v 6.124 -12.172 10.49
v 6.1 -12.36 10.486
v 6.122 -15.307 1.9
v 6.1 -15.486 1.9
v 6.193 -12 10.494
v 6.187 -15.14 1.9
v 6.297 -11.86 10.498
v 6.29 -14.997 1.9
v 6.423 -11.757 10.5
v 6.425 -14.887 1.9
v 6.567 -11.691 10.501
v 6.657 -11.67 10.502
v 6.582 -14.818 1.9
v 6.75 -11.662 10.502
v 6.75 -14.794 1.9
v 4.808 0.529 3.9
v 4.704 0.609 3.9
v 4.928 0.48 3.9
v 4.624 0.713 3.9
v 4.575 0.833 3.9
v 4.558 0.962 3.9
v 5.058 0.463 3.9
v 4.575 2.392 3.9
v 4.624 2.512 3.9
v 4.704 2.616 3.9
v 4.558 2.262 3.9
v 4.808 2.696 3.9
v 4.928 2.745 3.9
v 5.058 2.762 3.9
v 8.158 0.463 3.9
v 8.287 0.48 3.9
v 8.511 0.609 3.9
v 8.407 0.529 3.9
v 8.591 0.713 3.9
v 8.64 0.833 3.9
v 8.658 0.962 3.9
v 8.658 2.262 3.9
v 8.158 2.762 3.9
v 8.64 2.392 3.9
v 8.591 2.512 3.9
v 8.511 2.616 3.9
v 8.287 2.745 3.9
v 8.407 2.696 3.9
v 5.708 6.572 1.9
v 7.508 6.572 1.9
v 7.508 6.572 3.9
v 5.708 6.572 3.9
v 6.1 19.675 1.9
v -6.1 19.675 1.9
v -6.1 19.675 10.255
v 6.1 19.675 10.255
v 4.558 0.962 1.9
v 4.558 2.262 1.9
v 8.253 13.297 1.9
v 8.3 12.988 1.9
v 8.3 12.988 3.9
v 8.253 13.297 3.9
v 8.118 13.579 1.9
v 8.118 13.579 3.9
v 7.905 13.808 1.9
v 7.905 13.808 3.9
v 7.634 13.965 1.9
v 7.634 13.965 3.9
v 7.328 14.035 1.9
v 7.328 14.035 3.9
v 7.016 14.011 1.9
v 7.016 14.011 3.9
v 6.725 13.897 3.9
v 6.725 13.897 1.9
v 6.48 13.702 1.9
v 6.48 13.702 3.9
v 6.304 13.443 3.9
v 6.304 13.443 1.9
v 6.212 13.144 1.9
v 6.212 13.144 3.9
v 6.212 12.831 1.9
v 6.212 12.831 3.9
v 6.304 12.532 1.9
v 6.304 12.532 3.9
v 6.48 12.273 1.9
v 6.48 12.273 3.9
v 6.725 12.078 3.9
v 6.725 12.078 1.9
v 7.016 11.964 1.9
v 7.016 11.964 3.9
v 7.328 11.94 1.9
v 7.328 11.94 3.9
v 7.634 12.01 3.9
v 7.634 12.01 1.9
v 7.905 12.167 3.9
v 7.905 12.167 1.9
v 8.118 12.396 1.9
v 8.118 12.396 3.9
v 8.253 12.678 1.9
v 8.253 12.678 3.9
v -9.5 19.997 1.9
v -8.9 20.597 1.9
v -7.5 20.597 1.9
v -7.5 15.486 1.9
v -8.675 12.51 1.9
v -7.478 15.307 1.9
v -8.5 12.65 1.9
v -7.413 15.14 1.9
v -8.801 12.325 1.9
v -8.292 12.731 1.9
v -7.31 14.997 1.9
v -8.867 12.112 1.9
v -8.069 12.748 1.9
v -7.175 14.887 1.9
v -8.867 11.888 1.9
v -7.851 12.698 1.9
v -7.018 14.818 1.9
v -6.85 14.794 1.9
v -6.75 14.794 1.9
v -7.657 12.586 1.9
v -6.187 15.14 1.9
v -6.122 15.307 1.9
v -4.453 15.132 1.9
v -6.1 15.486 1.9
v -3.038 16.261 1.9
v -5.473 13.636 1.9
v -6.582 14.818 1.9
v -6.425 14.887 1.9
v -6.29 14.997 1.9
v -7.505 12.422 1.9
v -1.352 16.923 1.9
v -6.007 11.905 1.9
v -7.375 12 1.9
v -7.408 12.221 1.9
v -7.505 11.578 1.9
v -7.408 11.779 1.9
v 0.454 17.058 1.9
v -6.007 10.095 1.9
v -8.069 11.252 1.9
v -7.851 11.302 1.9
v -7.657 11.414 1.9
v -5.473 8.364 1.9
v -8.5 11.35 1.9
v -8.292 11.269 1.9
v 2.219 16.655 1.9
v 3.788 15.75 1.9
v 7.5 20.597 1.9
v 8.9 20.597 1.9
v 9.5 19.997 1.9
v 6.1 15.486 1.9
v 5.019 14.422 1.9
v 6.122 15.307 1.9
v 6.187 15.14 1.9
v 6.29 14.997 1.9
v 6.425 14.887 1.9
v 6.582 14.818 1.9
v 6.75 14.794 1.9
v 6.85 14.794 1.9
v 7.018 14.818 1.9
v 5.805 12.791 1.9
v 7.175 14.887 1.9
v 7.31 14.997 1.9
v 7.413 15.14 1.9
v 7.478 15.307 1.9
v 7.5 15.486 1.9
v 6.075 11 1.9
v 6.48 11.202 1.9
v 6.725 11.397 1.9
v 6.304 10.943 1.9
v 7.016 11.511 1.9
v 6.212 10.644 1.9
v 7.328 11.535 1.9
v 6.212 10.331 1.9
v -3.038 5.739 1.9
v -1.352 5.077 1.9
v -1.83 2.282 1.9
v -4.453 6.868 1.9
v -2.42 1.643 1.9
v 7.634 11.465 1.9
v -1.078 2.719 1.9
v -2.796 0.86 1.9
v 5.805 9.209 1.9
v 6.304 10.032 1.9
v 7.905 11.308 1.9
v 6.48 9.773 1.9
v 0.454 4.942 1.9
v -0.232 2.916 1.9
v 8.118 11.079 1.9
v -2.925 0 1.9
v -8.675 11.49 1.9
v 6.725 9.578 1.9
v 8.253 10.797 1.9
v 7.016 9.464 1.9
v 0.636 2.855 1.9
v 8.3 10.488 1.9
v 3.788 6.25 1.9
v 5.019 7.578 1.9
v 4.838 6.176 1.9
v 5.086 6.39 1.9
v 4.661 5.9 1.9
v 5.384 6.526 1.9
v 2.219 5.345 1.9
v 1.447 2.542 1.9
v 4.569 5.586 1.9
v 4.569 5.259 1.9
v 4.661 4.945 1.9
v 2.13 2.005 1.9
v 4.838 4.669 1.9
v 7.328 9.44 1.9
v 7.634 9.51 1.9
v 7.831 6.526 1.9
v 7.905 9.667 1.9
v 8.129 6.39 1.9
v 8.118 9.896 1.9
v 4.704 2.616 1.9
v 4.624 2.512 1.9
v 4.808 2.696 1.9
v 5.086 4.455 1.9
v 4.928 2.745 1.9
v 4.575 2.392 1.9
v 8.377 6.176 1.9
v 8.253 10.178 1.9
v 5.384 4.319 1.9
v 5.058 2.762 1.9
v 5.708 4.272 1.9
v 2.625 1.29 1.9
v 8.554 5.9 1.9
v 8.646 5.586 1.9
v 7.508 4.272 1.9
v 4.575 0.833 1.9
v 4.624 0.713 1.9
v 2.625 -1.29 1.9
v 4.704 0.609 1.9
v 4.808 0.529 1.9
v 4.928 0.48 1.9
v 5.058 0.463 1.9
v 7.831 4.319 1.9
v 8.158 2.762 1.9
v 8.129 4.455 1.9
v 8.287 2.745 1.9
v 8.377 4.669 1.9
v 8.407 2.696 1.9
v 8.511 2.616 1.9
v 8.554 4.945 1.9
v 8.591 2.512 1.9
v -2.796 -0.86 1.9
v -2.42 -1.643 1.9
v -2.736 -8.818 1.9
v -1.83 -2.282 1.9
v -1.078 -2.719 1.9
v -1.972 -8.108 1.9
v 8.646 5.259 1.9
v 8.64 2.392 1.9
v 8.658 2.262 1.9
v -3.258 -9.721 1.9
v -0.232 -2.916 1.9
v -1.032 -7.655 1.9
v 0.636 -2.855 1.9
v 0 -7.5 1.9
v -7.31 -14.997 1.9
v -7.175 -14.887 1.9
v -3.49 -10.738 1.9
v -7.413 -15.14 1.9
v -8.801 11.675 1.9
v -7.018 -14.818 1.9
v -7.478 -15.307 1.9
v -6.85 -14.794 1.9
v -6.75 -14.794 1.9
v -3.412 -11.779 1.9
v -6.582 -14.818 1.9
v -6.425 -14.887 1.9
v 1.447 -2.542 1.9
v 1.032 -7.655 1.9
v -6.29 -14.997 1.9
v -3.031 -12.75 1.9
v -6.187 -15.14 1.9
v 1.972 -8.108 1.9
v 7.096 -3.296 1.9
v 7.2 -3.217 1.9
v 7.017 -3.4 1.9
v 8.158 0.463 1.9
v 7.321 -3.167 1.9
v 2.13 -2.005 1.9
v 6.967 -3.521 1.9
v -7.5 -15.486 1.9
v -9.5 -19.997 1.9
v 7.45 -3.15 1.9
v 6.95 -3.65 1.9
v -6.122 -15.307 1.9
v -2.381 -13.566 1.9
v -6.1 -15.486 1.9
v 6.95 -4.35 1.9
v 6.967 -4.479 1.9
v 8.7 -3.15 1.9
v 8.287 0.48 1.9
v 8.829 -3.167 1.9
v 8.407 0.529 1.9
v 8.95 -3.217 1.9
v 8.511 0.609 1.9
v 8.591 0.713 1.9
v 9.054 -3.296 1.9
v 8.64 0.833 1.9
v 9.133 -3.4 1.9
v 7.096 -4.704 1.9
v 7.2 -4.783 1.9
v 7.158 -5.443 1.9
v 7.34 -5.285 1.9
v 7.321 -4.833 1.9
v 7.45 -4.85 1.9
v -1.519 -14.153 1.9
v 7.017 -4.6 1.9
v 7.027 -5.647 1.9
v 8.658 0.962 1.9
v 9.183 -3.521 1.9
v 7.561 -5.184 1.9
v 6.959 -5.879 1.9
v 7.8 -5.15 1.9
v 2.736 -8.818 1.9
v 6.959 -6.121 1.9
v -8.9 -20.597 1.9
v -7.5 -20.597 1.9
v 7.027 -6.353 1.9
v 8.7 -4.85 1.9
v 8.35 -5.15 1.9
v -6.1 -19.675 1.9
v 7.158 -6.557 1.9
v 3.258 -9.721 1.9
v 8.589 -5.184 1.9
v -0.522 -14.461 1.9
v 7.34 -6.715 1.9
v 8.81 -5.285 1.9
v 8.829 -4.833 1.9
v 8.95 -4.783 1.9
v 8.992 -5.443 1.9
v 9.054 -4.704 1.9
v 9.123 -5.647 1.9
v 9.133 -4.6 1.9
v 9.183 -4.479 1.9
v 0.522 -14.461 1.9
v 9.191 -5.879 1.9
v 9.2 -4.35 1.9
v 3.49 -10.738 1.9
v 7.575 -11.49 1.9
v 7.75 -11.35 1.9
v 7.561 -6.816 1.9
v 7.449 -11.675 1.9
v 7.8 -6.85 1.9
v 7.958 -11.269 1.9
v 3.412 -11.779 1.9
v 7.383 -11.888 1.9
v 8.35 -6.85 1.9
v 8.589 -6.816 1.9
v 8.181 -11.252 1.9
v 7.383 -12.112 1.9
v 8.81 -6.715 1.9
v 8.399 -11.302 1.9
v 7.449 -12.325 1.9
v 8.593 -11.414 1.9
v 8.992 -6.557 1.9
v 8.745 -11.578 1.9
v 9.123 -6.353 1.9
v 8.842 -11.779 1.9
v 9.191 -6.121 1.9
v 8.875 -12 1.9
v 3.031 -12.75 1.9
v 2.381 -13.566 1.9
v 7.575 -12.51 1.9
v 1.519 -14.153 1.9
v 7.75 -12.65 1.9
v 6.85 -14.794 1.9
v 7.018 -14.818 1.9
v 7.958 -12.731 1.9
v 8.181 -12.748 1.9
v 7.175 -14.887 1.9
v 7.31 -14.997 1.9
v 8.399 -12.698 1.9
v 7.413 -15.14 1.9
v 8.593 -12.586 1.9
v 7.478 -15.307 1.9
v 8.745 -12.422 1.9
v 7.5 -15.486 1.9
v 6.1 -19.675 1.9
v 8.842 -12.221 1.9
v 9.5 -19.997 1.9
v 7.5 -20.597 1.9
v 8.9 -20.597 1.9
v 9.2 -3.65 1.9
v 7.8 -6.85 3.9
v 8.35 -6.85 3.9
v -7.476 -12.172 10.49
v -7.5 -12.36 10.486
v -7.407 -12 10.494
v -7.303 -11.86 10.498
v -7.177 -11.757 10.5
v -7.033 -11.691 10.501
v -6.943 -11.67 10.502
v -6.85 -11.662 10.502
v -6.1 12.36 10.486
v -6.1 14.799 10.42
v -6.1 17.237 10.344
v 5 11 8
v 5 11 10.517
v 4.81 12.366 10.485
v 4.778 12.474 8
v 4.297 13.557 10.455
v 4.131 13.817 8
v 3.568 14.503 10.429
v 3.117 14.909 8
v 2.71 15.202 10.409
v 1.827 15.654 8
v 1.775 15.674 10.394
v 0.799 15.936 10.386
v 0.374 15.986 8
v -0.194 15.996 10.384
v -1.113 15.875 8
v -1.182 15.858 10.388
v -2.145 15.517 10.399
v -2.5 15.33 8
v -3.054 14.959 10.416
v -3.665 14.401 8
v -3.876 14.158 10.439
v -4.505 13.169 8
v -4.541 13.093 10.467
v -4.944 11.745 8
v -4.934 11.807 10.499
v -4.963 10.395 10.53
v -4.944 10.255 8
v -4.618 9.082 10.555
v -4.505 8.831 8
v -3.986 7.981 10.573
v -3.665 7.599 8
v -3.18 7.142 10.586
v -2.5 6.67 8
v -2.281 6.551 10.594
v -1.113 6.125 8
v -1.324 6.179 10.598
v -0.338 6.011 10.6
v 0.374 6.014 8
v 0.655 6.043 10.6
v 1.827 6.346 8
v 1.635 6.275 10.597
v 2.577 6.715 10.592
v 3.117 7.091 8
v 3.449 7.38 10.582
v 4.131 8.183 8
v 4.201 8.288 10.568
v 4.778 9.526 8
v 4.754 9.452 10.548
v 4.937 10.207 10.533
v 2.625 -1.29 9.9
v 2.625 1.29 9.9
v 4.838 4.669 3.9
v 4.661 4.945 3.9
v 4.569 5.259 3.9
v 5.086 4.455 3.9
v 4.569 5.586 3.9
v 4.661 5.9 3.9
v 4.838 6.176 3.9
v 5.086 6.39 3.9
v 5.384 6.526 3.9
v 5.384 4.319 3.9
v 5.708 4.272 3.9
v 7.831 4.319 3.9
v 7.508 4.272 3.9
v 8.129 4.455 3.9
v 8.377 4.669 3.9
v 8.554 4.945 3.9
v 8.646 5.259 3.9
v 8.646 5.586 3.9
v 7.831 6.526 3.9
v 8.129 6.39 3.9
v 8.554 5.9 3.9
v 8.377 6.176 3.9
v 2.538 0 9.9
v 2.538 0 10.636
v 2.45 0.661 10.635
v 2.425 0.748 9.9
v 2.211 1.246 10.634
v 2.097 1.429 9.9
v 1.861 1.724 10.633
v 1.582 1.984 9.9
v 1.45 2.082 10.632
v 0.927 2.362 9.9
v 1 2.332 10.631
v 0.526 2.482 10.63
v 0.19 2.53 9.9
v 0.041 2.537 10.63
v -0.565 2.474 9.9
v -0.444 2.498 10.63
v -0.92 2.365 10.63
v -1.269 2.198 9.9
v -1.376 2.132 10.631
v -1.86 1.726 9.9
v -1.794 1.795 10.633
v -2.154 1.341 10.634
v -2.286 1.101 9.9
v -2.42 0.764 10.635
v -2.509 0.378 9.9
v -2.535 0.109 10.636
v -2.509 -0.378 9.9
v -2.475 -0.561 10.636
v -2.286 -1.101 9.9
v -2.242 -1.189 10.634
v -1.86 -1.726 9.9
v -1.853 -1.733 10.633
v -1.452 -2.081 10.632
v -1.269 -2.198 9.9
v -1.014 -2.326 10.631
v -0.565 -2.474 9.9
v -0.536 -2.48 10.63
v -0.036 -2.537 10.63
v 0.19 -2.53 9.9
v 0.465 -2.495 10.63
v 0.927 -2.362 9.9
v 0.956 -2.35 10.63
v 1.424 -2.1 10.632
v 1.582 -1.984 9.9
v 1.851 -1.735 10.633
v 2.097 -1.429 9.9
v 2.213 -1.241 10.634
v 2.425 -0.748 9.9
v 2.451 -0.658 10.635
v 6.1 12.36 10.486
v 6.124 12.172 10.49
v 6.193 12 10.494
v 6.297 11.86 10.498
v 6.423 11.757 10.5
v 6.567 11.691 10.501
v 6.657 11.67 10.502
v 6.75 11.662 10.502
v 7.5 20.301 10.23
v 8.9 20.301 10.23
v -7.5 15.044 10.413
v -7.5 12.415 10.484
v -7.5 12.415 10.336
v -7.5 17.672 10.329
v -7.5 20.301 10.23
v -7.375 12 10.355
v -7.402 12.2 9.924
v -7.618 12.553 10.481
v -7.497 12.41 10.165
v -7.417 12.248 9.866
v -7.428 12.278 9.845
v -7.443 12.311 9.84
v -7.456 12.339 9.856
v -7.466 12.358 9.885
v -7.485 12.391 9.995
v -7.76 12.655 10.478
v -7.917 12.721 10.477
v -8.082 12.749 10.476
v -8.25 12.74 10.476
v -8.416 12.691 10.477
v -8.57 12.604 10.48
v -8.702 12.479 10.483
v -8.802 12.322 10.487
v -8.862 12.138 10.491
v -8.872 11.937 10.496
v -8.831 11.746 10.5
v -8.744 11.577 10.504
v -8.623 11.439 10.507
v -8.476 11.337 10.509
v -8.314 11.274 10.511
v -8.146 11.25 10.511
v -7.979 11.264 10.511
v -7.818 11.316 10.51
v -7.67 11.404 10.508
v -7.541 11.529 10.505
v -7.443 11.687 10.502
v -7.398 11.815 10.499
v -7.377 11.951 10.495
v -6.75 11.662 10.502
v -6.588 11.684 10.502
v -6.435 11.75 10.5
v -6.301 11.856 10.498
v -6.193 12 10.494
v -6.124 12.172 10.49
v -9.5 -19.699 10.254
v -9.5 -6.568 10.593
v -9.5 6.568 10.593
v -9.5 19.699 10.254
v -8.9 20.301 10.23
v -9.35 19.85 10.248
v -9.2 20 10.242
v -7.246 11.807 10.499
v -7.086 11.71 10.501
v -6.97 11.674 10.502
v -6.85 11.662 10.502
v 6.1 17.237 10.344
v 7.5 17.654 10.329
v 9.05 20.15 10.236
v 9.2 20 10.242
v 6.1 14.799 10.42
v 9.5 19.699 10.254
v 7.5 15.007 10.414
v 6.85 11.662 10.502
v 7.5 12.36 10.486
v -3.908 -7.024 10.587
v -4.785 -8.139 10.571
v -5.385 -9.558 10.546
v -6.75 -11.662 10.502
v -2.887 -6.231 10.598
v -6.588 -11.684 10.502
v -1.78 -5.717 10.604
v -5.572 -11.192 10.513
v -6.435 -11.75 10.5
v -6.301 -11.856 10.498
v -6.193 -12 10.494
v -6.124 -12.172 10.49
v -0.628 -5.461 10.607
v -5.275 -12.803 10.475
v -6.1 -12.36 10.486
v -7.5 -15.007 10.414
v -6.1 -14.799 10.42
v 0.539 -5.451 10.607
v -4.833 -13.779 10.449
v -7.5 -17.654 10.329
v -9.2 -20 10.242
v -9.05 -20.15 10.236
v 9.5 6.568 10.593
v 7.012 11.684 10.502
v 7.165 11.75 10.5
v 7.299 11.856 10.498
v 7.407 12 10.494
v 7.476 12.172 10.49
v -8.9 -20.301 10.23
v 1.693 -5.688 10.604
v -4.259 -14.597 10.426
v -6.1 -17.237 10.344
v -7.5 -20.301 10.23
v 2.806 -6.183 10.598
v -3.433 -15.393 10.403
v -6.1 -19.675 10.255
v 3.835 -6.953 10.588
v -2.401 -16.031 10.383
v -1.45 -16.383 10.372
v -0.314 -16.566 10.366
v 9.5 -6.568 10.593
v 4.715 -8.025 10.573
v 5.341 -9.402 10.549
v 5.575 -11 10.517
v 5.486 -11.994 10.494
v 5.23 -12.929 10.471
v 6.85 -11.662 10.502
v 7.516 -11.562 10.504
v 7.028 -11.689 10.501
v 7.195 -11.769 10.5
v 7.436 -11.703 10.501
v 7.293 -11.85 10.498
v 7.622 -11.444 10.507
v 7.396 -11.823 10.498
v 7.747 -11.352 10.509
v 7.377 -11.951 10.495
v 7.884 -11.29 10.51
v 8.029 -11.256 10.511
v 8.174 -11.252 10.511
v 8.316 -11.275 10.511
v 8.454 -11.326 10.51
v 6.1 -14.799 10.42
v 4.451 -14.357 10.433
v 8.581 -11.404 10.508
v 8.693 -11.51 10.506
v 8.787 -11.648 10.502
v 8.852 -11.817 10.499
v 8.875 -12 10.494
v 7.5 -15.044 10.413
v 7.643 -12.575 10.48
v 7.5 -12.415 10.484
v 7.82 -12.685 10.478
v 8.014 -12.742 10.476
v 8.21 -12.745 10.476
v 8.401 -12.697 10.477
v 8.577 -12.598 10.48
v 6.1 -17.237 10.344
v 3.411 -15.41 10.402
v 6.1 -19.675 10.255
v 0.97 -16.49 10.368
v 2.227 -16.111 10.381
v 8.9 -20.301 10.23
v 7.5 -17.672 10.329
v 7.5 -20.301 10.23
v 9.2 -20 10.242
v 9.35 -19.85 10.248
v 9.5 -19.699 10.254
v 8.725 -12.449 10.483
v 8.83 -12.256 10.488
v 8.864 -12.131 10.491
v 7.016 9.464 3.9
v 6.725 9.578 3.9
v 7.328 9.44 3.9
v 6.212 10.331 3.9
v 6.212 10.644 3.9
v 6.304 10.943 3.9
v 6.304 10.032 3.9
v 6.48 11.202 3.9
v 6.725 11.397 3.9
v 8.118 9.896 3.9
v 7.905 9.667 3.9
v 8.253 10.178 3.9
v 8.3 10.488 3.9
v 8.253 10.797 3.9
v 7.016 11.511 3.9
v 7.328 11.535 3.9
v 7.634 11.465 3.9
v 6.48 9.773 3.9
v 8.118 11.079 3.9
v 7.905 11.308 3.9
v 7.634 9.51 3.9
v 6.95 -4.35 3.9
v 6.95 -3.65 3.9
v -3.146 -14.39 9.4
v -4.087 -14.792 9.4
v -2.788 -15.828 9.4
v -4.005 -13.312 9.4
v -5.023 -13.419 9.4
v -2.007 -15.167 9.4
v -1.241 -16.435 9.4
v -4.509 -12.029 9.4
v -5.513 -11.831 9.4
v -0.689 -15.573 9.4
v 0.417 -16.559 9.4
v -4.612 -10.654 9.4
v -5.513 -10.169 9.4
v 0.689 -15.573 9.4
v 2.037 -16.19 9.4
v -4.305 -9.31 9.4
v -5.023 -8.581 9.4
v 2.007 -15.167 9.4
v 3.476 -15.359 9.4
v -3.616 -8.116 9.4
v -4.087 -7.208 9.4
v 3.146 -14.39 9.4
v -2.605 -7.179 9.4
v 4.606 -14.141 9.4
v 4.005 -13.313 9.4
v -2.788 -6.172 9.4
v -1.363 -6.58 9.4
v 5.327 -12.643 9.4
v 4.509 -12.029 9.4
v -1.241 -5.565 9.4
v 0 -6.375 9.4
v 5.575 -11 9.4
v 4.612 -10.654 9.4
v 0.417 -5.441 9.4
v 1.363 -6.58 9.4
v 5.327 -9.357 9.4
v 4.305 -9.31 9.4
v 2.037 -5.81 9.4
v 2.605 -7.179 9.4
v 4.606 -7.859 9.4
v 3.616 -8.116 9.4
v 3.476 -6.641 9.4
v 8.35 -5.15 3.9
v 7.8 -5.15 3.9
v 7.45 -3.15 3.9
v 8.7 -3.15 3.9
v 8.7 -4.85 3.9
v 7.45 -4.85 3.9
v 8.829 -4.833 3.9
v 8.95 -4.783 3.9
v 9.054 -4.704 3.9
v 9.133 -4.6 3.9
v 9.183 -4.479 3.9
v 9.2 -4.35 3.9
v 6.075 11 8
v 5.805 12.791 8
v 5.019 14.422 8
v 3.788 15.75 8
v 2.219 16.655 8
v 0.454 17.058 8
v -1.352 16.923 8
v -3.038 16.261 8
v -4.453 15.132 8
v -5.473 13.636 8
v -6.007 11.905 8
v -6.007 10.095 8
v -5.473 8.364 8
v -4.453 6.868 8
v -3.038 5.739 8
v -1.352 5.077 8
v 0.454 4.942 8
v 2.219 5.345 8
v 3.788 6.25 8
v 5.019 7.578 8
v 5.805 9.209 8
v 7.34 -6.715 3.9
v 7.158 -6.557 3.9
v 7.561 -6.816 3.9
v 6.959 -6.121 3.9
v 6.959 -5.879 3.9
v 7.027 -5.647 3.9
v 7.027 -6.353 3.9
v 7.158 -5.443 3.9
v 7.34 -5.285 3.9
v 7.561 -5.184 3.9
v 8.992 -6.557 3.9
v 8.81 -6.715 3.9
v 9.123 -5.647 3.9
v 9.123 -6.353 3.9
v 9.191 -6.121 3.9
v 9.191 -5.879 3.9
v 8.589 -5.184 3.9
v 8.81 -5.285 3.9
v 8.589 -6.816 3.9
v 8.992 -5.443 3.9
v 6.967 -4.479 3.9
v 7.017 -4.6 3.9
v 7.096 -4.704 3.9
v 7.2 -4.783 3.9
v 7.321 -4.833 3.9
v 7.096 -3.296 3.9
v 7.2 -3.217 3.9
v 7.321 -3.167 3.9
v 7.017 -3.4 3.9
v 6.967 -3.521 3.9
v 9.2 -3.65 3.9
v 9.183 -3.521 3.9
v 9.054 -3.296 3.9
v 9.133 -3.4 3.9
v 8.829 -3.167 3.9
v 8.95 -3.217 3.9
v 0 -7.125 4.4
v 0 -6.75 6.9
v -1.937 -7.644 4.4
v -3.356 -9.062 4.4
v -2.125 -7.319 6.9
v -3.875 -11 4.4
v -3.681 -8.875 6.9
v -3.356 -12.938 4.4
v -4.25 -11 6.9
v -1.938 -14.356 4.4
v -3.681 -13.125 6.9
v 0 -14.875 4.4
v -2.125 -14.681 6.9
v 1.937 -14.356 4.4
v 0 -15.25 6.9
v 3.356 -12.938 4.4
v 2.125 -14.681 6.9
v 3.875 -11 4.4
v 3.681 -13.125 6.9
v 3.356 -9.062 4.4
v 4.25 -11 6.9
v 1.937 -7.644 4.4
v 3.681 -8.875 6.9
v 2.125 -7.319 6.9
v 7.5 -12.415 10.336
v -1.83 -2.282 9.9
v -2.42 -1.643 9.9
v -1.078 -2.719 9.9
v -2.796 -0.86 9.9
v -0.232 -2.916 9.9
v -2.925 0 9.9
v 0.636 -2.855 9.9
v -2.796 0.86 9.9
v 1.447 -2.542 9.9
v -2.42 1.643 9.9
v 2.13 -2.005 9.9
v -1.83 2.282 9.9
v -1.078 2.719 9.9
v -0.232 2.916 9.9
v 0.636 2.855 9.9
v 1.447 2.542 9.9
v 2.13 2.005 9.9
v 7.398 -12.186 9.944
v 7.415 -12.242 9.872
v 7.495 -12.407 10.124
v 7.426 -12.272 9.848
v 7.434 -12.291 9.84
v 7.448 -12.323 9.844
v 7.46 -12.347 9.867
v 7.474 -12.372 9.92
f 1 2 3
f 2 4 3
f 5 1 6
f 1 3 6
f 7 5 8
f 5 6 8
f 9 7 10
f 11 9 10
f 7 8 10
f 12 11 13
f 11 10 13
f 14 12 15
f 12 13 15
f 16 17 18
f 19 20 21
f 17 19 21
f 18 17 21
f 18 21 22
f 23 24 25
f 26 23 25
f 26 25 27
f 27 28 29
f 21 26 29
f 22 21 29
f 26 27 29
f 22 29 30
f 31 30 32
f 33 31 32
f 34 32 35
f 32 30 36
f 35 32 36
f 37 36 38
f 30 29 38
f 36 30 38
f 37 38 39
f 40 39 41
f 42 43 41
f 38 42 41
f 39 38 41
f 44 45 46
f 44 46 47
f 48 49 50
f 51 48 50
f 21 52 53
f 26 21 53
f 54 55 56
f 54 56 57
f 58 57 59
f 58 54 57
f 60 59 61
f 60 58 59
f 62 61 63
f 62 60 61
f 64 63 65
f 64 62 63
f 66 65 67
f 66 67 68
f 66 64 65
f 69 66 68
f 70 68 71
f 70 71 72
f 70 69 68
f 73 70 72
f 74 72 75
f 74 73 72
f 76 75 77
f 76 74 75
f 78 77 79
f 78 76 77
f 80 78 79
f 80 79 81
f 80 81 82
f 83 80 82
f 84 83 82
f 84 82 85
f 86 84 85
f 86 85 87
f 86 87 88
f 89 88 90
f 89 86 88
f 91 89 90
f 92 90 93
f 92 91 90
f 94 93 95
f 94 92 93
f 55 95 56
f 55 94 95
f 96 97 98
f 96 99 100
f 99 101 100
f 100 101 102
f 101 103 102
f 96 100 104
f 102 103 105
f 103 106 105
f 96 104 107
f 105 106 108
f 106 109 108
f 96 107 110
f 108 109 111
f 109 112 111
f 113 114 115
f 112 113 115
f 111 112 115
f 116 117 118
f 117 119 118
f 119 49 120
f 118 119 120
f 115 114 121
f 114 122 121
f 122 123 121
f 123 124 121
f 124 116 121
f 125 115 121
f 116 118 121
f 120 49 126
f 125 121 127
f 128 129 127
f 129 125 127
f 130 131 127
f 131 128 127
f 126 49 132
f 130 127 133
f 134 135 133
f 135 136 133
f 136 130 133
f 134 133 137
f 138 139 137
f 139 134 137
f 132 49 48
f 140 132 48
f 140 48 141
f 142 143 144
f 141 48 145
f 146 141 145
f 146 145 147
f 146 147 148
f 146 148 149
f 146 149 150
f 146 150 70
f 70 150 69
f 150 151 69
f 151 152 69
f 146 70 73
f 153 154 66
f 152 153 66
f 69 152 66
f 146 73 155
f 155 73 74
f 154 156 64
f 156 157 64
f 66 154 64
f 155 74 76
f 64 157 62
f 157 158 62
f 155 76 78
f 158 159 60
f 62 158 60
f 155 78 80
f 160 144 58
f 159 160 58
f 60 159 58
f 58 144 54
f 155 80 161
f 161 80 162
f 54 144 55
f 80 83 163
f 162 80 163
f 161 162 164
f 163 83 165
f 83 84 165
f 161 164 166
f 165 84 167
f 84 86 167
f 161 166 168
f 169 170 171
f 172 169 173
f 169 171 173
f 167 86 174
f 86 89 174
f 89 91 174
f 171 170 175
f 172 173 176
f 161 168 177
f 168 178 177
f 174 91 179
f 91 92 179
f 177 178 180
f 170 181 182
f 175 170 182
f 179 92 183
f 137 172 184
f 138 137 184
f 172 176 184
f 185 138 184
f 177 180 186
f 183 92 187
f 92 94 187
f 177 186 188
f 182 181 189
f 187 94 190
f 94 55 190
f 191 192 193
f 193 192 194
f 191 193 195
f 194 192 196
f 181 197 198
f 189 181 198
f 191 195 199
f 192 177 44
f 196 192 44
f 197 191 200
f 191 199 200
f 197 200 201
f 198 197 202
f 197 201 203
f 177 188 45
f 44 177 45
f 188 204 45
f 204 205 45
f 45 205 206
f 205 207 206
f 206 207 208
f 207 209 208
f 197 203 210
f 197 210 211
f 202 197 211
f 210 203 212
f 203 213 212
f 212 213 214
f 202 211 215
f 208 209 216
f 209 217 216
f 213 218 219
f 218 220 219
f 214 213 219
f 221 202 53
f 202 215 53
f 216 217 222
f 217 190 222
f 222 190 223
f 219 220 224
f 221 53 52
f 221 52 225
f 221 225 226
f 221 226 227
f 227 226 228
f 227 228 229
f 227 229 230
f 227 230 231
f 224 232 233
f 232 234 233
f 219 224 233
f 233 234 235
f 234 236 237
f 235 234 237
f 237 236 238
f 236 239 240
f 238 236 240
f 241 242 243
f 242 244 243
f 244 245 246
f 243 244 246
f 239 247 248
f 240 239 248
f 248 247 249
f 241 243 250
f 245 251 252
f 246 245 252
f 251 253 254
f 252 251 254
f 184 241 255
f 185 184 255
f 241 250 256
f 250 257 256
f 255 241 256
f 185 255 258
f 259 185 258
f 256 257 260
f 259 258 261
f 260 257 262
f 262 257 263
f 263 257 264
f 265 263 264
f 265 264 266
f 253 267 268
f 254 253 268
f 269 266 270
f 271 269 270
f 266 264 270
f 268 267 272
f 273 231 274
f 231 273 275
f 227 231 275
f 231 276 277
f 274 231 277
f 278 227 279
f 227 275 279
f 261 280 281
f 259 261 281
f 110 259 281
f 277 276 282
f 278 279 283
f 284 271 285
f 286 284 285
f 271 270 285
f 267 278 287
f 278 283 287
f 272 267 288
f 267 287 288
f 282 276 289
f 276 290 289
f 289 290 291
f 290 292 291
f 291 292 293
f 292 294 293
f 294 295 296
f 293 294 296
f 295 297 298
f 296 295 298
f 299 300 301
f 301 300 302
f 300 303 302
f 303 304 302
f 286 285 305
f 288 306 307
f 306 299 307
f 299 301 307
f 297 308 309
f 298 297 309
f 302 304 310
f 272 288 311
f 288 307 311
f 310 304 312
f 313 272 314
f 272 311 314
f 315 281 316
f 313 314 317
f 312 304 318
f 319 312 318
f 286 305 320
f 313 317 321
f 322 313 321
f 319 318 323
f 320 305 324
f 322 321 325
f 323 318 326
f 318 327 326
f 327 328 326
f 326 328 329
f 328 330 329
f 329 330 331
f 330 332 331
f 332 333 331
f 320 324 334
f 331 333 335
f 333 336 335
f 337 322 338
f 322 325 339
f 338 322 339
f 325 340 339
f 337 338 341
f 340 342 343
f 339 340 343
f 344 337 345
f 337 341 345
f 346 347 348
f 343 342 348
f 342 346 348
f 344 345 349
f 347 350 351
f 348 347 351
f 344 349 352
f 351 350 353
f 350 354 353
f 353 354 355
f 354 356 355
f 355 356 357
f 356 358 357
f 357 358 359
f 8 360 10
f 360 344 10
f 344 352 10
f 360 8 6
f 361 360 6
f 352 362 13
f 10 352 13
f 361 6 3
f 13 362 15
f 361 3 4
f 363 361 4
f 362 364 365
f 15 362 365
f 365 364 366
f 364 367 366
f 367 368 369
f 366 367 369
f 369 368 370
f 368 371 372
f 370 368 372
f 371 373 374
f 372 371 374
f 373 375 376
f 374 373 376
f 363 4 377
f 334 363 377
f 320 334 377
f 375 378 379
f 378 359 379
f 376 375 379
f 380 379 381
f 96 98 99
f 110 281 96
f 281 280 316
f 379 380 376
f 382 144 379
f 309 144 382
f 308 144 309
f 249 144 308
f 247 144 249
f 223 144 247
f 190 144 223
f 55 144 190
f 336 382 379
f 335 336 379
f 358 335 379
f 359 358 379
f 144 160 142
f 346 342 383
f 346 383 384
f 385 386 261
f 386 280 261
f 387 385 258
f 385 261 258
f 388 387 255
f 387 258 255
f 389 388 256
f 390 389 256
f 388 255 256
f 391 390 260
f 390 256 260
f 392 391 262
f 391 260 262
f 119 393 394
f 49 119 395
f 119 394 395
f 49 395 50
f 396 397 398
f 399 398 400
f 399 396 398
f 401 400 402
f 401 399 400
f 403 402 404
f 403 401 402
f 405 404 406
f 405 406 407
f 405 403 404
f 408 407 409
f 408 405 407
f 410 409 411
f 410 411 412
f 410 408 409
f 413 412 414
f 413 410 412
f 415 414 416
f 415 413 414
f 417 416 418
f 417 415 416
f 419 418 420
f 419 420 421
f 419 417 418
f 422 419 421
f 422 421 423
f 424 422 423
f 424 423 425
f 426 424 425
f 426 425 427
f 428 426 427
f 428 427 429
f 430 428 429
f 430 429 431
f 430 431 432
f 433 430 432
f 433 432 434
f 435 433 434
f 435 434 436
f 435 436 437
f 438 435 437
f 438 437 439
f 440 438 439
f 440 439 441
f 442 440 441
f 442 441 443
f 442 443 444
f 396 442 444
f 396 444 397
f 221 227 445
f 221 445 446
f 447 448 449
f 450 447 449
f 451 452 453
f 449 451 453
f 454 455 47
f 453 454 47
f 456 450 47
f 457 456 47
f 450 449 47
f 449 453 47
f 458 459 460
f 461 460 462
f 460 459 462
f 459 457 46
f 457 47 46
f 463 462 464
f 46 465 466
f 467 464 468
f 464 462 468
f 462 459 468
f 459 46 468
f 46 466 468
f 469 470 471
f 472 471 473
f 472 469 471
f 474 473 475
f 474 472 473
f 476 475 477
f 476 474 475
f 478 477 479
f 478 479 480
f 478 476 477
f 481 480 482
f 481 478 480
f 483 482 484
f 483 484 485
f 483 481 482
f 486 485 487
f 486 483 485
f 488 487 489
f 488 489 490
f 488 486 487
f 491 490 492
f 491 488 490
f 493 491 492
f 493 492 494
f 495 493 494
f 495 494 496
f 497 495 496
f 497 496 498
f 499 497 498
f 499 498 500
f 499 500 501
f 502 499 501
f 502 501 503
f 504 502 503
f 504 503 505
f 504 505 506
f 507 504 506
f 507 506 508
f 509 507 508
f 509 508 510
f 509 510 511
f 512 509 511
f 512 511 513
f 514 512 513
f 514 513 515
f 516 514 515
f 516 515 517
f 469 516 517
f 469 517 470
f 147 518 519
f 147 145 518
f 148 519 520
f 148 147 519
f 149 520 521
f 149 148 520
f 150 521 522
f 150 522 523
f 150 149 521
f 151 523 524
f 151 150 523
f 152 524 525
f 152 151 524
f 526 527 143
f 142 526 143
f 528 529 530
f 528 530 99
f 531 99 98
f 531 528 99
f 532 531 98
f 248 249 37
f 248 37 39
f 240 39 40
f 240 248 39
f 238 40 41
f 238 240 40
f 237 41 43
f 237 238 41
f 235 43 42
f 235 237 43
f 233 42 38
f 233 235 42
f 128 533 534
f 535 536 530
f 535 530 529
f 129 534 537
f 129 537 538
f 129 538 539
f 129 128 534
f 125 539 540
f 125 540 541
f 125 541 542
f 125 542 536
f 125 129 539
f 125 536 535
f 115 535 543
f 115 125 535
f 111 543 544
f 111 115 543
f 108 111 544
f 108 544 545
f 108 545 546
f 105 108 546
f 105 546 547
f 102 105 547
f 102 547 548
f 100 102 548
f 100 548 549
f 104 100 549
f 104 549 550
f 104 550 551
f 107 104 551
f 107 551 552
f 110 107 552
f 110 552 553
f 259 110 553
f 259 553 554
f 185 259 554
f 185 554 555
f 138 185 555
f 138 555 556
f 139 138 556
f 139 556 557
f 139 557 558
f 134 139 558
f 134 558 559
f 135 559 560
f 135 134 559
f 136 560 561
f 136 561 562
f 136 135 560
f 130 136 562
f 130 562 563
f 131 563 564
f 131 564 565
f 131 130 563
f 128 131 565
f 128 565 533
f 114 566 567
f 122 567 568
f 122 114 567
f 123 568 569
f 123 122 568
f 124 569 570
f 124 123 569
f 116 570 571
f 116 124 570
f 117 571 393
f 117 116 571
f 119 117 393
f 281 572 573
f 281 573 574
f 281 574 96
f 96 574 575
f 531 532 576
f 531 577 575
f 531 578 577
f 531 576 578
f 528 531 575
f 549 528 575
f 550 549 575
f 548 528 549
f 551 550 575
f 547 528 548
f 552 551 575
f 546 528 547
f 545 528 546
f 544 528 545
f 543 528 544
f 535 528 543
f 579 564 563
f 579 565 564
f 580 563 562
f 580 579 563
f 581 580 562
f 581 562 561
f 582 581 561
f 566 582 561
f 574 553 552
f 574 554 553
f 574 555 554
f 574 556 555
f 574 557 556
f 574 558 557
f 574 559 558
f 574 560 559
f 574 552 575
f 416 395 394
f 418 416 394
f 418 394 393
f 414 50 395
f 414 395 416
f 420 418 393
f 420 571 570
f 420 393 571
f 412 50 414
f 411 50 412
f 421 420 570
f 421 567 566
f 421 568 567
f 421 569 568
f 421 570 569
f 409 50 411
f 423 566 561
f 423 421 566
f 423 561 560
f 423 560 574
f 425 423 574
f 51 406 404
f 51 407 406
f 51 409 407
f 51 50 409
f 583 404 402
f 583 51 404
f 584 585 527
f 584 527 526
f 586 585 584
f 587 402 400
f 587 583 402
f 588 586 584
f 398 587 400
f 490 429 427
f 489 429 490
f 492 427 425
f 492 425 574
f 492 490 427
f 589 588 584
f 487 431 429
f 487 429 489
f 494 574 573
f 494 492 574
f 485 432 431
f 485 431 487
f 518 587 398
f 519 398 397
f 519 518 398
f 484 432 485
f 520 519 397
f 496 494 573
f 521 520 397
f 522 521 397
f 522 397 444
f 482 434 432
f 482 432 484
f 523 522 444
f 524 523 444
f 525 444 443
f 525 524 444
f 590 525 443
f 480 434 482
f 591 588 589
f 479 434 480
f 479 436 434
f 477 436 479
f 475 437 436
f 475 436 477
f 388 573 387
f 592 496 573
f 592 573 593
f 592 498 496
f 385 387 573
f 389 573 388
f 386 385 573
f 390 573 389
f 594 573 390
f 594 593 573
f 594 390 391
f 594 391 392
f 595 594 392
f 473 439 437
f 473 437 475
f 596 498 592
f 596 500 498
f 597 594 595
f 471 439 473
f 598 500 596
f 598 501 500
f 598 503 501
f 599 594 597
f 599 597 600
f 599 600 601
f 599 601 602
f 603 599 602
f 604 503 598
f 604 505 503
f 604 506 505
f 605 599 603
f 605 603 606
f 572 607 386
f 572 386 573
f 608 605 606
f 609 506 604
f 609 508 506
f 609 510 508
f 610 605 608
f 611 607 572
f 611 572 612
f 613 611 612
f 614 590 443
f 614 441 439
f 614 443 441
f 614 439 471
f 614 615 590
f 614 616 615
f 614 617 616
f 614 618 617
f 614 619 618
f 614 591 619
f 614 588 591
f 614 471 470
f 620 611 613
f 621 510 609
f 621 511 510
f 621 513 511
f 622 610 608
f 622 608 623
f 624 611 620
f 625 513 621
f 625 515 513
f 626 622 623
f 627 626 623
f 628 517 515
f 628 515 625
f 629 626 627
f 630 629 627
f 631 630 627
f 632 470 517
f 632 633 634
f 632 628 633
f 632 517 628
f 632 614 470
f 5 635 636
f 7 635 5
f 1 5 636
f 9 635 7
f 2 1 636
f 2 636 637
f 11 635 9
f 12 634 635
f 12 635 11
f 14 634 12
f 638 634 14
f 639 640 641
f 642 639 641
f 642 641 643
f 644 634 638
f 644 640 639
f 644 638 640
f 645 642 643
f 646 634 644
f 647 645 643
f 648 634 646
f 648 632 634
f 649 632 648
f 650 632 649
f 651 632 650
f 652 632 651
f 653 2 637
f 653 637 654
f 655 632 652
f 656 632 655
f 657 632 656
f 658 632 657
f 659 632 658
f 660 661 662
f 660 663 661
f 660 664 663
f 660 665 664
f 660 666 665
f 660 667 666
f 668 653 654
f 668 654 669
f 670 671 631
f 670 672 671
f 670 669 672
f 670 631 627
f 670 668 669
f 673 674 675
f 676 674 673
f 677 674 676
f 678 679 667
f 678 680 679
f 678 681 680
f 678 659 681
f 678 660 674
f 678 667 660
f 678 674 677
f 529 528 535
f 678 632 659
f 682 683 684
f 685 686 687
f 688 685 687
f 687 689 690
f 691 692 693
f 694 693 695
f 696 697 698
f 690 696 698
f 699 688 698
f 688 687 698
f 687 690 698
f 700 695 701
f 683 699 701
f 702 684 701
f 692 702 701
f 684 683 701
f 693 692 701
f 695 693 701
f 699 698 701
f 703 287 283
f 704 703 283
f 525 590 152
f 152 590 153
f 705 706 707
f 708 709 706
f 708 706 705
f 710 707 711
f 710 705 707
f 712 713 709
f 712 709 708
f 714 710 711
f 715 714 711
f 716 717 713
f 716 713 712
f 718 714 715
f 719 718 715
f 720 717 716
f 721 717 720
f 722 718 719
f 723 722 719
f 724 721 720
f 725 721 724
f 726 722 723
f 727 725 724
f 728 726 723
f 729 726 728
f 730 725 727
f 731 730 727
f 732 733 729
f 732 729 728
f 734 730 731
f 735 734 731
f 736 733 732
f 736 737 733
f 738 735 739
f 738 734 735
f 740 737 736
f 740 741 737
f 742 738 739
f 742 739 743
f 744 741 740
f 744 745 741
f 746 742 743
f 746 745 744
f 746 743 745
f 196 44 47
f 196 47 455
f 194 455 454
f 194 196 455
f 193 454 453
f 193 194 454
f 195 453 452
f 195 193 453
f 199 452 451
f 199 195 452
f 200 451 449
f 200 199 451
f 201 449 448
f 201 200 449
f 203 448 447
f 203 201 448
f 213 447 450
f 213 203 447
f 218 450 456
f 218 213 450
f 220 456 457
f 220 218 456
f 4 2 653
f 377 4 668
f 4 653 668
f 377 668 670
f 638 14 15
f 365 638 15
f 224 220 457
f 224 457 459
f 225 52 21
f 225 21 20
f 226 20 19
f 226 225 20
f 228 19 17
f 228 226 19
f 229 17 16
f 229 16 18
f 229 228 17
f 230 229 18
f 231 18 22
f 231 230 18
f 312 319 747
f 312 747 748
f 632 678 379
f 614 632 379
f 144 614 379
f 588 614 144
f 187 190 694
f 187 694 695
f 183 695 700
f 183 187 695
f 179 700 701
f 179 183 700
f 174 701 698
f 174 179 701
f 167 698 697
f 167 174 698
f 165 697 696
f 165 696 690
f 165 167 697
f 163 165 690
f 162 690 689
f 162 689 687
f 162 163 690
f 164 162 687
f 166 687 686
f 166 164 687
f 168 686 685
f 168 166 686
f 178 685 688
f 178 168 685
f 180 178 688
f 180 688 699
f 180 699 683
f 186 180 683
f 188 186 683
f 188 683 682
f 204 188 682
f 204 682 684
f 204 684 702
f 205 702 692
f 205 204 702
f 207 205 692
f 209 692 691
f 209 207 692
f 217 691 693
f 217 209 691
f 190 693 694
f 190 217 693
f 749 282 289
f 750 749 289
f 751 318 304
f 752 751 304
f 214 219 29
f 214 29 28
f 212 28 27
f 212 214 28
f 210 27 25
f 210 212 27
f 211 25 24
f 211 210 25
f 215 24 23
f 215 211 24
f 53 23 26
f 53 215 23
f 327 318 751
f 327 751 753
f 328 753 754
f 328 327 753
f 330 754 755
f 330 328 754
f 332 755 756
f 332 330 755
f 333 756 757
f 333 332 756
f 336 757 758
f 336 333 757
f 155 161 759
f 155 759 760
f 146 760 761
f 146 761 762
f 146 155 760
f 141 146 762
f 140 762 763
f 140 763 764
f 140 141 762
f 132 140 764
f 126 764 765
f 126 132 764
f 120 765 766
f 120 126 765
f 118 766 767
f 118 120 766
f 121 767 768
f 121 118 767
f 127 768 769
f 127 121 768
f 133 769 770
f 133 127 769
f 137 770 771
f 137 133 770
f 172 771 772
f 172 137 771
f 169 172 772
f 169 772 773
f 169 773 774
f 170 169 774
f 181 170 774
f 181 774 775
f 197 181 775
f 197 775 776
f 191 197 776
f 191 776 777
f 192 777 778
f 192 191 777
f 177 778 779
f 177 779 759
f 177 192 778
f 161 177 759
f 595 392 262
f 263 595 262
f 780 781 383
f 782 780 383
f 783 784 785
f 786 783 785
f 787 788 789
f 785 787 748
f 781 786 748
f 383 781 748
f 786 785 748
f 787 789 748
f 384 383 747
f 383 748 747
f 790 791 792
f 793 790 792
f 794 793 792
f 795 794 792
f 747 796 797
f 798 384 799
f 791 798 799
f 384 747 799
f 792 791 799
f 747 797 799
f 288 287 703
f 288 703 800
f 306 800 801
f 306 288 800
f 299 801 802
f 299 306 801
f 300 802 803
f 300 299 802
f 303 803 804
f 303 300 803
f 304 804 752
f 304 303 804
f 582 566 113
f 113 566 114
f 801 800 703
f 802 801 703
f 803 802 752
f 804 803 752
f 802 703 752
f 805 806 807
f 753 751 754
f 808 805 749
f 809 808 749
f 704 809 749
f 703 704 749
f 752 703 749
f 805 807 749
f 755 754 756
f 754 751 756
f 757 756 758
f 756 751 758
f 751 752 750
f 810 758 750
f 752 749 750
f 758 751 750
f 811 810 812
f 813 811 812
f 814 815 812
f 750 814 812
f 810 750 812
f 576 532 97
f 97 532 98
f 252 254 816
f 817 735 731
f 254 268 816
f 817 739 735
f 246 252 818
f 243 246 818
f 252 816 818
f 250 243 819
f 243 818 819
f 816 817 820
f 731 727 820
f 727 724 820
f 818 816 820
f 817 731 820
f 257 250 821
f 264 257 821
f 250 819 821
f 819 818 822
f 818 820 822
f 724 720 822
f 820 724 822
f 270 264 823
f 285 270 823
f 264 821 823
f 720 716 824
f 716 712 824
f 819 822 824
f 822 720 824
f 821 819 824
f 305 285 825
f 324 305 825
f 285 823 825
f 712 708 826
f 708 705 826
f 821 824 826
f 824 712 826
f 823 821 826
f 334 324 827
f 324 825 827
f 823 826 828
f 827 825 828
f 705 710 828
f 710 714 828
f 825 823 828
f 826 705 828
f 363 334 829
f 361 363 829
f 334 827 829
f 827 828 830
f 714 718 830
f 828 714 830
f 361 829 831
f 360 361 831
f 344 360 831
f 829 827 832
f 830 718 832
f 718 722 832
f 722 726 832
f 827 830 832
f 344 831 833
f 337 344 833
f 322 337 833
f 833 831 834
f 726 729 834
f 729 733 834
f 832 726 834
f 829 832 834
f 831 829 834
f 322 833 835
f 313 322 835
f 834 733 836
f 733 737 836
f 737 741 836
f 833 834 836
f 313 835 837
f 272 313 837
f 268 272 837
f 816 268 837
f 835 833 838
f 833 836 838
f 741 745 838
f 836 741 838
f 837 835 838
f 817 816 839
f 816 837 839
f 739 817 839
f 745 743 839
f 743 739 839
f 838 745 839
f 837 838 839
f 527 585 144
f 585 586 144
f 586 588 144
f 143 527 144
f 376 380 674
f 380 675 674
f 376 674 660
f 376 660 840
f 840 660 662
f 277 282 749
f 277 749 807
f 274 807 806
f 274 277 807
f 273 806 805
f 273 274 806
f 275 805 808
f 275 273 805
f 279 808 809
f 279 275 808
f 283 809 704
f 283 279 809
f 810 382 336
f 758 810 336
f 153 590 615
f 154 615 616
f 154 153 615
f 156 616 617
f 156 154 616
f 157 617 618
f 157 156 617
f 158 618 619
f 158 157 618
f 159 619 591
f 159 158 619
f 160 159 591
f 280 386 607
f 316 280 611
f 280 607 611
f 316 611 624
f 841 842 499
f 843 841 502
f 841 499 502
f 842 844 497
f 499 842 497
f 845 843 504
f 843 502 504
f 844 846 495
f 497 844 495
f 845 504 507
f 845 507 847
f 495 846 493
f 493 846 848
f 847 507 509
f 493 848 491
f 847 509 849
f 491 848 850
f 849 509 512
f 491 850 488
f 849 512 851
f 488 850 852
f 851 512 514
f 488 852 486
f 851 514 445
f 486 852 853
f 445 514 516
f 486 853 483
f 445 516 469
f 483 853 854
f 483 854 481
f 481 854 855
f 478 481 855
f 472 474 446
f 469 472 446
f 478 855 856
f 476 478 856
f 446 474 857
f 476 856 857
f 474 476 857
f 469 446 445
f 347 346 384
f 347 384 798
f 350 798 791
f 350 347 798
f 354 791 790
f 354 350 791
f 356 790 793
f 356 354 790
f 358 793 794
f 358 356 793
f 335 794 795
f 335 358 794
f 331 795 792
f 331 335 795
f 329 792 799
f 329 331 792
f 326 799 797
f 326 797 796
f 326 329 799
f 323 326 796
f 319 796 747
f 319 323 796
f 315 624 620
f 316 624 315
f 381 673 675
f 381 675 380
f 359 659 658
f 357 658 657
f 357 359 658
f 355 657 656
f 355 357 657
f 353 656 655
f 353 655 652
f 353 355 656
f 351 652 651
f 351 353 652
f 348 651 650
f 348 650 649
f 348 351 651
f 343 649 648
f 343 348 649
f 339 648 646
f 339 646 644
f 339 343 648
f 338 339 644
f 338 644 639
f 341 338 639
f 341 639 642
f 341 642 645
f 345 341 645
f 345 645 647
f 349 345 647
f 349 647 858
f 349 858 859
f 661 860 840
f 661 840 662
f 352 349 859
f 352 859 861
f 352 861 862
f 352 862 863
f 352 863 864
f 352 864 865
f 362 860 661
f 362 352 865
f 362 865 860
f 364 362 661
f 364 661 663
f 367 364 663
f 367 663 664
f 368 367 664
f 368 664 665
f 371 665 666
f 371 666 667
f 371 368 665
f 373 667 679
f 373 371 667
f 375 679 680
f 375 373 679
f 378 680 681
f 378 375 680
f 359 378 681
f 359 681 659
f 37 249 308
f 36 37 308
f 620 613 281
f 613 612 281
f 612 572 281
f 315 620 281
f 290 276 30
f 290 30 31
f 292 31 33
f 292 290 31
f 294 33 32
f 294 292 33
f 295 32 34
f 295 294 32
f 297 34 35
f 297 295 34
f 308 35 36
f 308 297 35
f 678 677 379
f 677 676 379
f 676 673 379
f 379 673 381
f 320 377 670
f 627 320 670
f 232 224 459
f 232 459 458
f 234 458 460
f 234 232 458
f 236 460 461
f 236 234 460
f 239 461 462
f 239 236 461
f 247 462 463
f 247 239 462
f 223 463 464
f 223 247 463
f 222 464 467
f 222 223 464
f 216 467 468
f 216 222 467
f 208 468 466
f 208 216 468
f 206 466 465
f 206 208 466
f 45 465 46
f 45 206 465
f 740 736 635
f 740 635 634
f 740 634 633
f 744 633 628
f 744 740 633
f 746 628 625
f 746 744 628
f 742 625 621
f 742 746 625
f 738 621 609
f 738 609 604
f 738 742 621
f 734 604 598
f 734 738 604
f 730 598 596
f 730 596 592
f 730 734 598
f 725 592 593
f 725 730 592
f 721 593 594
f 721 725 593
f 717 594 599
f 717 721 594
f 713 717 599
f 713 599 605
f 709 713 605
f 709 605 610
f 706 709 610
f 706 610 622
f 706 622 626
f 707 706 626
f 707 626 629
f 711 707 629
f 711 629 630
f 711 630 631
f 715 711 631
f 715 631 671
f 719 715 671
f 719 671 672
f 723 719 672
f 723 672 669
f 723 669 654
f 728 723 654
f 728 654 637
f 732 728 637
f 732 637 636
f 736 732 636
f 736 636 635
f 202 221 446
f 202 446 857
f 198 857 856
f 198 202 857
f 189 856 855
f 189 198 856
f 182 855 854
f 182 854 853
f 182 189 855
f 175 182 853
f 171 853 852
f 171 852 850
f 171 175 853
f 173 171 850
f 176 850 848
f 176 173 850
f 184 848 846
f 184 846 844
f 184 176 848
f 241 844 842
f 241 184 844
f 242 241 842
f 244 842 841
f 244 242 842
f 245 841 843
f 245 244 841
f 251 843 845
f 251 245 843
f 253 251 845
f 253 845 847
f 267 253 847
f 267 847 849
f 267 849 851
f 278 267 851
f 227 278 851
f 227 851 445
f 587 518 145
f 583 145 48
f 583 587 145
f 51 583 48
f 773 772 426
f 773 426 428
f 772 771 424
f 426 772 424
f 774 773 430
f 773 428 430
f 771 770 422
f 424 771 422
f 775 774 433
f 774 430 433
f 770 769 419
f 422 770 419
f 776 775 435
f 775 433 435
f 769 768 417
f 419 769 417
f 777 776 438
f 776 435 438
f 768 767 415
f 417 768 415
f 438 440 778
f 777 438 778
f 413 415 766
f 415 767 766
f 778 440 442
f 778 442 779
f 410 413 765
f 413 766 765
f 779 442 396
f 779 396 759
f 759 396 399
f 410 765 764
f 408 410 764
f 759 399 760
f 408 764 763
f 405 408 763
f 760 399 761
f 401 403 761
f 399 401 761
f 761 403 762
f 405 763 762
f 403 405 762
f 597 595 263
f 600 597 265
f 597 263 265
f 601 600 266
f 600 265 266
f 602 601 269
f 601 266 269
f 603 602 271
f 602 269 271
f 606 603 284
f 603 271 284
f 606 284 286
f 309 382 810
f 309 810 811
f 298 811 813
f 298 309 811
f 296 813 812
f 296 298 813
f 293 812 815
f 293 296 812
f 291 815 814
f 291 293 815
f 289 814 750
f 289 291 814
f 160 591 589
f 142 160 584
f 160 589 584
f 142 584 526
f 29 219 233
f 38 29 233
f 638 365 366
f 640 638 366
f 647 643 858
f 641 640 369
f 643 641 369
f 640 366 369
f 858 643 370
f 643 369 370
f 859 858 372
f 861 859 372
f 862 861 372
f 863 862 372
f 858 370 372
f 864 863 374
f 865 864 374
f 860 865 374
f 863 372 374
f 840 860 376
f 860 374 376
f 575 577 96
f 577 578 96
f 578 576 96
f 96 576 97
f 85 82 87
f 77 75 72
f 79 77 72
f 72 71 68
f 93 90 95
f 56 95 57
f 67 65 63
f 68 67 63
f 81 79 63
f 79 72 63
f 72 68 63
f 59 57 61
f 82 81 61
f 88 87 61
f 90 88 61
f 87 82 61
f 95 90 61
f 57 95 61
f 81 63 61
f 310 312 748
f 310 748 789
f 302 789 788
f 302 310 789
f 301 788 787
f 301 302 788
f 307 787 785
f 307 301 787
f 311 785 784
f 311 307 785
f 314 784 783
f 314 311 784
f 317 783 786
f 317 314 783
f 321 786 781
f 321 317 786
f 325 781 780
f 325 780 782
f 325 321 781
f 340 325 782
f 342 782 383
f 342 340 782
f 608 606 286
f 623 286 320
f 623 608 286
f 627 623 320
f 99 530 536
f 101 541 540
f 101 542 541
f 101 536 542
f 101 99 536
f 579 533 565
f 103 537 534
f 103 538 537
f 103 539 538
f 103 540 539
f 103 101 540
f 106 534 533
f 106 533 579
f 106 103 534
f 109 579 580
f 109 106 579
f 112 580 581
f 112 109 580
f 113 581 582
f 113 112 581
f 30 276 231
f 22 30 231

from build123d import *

# Parameters (mm, degrees)
PAD008_DEPTH    = 9.5
SKETCH017_W     = 3
SKETCH017_H     = 10
POCKET002_DEPTH = 7.5
POCKET003_DEPTH = 0.7
POCKET004_DEPTH = 0.7
CHAMFER001_SIZE = 0.6
FILLET002_R     = 0.65
SKETCH014_R     = 1.05
POCKET005_DEPTH = 2
POCKET006_DEPTH = 8
SKETCH022_R     = 2.5375
POCKET007_DEPTH = 8.736873
SKETCH021_R     = 5.575
POCKET008_DEPTH = 1.236873
SKETCH024_R     = 6.075
POCKET009_DEPTH = 6.1
SKETCH025_R     = 5
POCKET010_DEPTH = 8.736873
SKETCH015_R     = 0.75
POCKET011_DEPTH = 8.736873


with BuildPart() as part:
    # Sketch016 → Pad008 (new body, symmetric)
    with BuildSketch(Plane.YZ):
        with BuildLine():
            ThreePointArc((20.3007, 8.33036), (0, 8.735873), (-20.3007, 8.33036))
            Line((-20.3007, 8.33036), (-20.59728, 0))
            Line((20.59728, 0), (-20.59728, 0))
            Line((20.3007, 8.33036), (20.59728, 0))
        make_face()
    extrude(amount=PAD008_DEPTH, both=True)

    # Sketch017 → Pocket002 (cut, symmetric)
    with BuildSketch(Plane.YZ):
        with Locations((21.175, 5)):
            Rectangle(SKETCH017_W, SKETCH017_H)
        with Locations((-21.175, 5)):
            Rectangle(SKETCH017_W, SKETCH017_H)
    extrude(amount=POCKET002_DEPTH, both=True, mode=Mode.SUBTRACT)

    # Sketch018 → Pocket003 (cut, symmetric)
    with BuildSketch(Plane.YZ.offset(6.8)):
        Polygon((-19.925, 8.9), (-11.553945, 8.9), (-18.398945, -9.9), (-19.925, -9.9), align=None)
        Polygon((19.925, 8.9), (11.553945, 8.9), (18.398945, -9.9), (19.925, -9.9), align=None)
    extrude(amount=POCKET003_DEPTH, both=True, mode=Mode.SUBTRACT)

    # Sketch019 → Pocket004 (cut, symmetric)
    with BuildSketch(Plane.YZ.offset(-6.8)):
        Polygon((-19.925, 8.9), (-11.553945, 8.9), (-18.398945, -9.9), (-19.925, -9.9), align=None)
        Polygon((19.925, 8.9), (11.553945, 8.9), (18.398945, -9.9), (19.925, -9.9), align=None)
    extrude(amount=POCKET004_DEPTH, both=True, mode=Mode.SUBTRACT)

    # Chamfer001
    chamfer001_edges = [part.edges().sort_by_distance(p)[0] for p in [
        (9.5, 20.44899, 4.16518),
        (9.5, -20.44899, 4.16518),
        (-9.5, -20.44899, 4.16518),
        (-9.5, 20.44899, 4.16518),
    ]]
    chamfer(chamfer001_edges, length=CHAMFER001_SIZE)

    # Fillet002
    fillet002_edges = [part.edges().sort_by_distance(p)[0] for p in [
        (7.5, 13.228407, 4.301038),
        (7.5, -13.228407, 4.301038),
        (-6.1, -13.228407, 4.301038),
        (-6.1, 13.228407, 4.301038),
        (-7.5, -13.228407, 4.301038),
        (6.1, -13.228407, 4.301038),
        (6.1, 13.228407, 4.301038),
        (-7.5, 13.228407, 4.301038),
    ]]
    fillet(fillet002_edges, radius=FILLET002_R)

    # Sketch014 → Pocket005 (cut)
    with BuildSketch(Plane.XY):
        with Locations((7.25, 10.4875)):
            Circle(SKETCH014_R)
        with Locations((7.25, 12.9875)):
            Circle(SKETCH014_R)
        with BuildLine():
            ThreePointArc((5.7075, 6.5725), (4.5575, 5.4225), (5.7075, 4.2725))
            Line((5.7075, 4.2725), (7.5075, 4.2725))
            ThreePointArc((7.5075, 4.2725), (8.6575, 5.4225), (7.5075, 6.5725))
            Line((7.5075, 6.5725), (5.7075, 6.5725))
        make_face()
        with BuildLine():
            ThreePointArc((7.8, -5.15), (6.95, -6), (7.8, -6.85))
            Line((7.8, -6.85), (8.35, -6.85))
            ThreePointArc((8.35, -6.85), (9.2, -6), (8.35, -5.15))
            Line((8.35, -5.15), (7.8, -5.15))
        make_face()
        with BuildLine():
            ThreePointArc((5.0575, 2.7625), (4.703947, 2.616053), (4.5575, 2.2625))
            Line((4.5575, 0.9625), (4.5575, 2.2625))
            ThreePointArc((4.5575, 0.9625), (4.703947, 0.608947), (5.0575, 0.4625))
            Line((8.1575, 0.4625), (5.0575, 0.4625))
            ThreePointArc((8.1575, 0.4625), (8.511053, 0.608947), (8.6575, 0.9625))
            Line((8.6575, 2.2625), (8.6575, 0.9625))
            ThreePointArc((8.6575, 2.2625), (8.511053, 2.616053), (8.1575, 2.7625))
            Line((5.0575, 2.7625), (8.1575, 2.7625))
        make_face()
        with BuildLine():
            ThreePointArc((7.45, -3.15), (7.096447, -3.296447), (6.95, -3.65))
            Line((6.95, -4.35), (6.95, -3.65))
            ThreePointArc((6.95, -4.35), (7.096447, -4.703553), (7.45, -4.85))
            Line((8.7, -4.85), (7.45, -4.85))
            ThreePointArc((8.7, -4.85), (9.053553, -4.703553), (9.2, -4.35))
            Line((9.2, -3.65), (9.2, -4.35))
            ThreePointArc((9.2, -3.65), (9.053553, -3.296447), (8.7, -3.15))
            Line((7.45, -3.15), (8.7, -3.15))
        make_face()
    extrude(amount=POCKET005_DEPTH, mode=Mode.SUBTRACT)

    # Sketch020 → Pocket006 (cut)
    with BuildSketch(Plane.XY):
        with BuildLine():
            ThreePointArc((2.625, 1.290349), (-2.925, 0), (2.625, -1.290349))
            Line((2.625, -1.290349), (2.625, 1.290349))
        make_face()
    extrude(amount=POCKET006_DEPTH, mode=Mode.SUBTRACT)

    # Sketch022 → Pocket007 (cut, through all)
    with BuildSketch(Plane.XY):
        Circle(SKETCH022_R)
    extrude(amount=POCKET007_DEPTH, mode=Mode.SUBTRACT)

    # Sketch021 → Pocket008 (cut, through all)
    with BuildSketch(Plane.XY.offset(7.5)):
        with Locations((0, -11)):
            Circle(SKETCH021_R)
    extrude(amount=POCKET008_DEPTH, mode=Mode.SUBTRACT)

    # Cone → Cone (revolve, cut)
    with BuildSketch(Plane(origin=(0, -11, 0), x_dir=(0, 1, 0), z_dir=(1, 0, 0))):
        Polygon((0, 0), (3.5, 0), (5, 10), (0, 10), align=None)
    revolve(axis=Axis((0, -11, 0), (0, 0, 1)), mode=Mode.SUBTRACT)

    # Sketch024 → Pocket009 (cut)
    with BuildSketch(Plane.XY):
        with Locations((0, 11)):
            Circle(SKETCH024_R)
    extrude(amount=POCKET009_DEPTH, mode=Mode.SUBTRACT)

    # Sketch025 → Pocket010 (cut, through all)
    with BuildSketch(Plane.XY):
        with Locations((0, 11)):
            Circle(SKETCH025_R)
    extrude(amount=POCKET010_DEPTH, mode=Mode.SUBTRACT)

    # Sketch015 → Pocket011 (cut, through all)
    with BuildSketch(Plane.XY):
        with Locations((-8.125, 12)):
            Circle(SKETCH015_R)
        with Locations((8.125, -12)):
            Circle(SKETCH015_R)
    extrude(amount=POCKET011_DEPTH, mode=Mode.SUBTRACT)


with BuildPart() as part_1:
    # Body005 placement: moved
    add(part.part.moved(Location((0, 0, 1.9))))


solid = part_1.part
